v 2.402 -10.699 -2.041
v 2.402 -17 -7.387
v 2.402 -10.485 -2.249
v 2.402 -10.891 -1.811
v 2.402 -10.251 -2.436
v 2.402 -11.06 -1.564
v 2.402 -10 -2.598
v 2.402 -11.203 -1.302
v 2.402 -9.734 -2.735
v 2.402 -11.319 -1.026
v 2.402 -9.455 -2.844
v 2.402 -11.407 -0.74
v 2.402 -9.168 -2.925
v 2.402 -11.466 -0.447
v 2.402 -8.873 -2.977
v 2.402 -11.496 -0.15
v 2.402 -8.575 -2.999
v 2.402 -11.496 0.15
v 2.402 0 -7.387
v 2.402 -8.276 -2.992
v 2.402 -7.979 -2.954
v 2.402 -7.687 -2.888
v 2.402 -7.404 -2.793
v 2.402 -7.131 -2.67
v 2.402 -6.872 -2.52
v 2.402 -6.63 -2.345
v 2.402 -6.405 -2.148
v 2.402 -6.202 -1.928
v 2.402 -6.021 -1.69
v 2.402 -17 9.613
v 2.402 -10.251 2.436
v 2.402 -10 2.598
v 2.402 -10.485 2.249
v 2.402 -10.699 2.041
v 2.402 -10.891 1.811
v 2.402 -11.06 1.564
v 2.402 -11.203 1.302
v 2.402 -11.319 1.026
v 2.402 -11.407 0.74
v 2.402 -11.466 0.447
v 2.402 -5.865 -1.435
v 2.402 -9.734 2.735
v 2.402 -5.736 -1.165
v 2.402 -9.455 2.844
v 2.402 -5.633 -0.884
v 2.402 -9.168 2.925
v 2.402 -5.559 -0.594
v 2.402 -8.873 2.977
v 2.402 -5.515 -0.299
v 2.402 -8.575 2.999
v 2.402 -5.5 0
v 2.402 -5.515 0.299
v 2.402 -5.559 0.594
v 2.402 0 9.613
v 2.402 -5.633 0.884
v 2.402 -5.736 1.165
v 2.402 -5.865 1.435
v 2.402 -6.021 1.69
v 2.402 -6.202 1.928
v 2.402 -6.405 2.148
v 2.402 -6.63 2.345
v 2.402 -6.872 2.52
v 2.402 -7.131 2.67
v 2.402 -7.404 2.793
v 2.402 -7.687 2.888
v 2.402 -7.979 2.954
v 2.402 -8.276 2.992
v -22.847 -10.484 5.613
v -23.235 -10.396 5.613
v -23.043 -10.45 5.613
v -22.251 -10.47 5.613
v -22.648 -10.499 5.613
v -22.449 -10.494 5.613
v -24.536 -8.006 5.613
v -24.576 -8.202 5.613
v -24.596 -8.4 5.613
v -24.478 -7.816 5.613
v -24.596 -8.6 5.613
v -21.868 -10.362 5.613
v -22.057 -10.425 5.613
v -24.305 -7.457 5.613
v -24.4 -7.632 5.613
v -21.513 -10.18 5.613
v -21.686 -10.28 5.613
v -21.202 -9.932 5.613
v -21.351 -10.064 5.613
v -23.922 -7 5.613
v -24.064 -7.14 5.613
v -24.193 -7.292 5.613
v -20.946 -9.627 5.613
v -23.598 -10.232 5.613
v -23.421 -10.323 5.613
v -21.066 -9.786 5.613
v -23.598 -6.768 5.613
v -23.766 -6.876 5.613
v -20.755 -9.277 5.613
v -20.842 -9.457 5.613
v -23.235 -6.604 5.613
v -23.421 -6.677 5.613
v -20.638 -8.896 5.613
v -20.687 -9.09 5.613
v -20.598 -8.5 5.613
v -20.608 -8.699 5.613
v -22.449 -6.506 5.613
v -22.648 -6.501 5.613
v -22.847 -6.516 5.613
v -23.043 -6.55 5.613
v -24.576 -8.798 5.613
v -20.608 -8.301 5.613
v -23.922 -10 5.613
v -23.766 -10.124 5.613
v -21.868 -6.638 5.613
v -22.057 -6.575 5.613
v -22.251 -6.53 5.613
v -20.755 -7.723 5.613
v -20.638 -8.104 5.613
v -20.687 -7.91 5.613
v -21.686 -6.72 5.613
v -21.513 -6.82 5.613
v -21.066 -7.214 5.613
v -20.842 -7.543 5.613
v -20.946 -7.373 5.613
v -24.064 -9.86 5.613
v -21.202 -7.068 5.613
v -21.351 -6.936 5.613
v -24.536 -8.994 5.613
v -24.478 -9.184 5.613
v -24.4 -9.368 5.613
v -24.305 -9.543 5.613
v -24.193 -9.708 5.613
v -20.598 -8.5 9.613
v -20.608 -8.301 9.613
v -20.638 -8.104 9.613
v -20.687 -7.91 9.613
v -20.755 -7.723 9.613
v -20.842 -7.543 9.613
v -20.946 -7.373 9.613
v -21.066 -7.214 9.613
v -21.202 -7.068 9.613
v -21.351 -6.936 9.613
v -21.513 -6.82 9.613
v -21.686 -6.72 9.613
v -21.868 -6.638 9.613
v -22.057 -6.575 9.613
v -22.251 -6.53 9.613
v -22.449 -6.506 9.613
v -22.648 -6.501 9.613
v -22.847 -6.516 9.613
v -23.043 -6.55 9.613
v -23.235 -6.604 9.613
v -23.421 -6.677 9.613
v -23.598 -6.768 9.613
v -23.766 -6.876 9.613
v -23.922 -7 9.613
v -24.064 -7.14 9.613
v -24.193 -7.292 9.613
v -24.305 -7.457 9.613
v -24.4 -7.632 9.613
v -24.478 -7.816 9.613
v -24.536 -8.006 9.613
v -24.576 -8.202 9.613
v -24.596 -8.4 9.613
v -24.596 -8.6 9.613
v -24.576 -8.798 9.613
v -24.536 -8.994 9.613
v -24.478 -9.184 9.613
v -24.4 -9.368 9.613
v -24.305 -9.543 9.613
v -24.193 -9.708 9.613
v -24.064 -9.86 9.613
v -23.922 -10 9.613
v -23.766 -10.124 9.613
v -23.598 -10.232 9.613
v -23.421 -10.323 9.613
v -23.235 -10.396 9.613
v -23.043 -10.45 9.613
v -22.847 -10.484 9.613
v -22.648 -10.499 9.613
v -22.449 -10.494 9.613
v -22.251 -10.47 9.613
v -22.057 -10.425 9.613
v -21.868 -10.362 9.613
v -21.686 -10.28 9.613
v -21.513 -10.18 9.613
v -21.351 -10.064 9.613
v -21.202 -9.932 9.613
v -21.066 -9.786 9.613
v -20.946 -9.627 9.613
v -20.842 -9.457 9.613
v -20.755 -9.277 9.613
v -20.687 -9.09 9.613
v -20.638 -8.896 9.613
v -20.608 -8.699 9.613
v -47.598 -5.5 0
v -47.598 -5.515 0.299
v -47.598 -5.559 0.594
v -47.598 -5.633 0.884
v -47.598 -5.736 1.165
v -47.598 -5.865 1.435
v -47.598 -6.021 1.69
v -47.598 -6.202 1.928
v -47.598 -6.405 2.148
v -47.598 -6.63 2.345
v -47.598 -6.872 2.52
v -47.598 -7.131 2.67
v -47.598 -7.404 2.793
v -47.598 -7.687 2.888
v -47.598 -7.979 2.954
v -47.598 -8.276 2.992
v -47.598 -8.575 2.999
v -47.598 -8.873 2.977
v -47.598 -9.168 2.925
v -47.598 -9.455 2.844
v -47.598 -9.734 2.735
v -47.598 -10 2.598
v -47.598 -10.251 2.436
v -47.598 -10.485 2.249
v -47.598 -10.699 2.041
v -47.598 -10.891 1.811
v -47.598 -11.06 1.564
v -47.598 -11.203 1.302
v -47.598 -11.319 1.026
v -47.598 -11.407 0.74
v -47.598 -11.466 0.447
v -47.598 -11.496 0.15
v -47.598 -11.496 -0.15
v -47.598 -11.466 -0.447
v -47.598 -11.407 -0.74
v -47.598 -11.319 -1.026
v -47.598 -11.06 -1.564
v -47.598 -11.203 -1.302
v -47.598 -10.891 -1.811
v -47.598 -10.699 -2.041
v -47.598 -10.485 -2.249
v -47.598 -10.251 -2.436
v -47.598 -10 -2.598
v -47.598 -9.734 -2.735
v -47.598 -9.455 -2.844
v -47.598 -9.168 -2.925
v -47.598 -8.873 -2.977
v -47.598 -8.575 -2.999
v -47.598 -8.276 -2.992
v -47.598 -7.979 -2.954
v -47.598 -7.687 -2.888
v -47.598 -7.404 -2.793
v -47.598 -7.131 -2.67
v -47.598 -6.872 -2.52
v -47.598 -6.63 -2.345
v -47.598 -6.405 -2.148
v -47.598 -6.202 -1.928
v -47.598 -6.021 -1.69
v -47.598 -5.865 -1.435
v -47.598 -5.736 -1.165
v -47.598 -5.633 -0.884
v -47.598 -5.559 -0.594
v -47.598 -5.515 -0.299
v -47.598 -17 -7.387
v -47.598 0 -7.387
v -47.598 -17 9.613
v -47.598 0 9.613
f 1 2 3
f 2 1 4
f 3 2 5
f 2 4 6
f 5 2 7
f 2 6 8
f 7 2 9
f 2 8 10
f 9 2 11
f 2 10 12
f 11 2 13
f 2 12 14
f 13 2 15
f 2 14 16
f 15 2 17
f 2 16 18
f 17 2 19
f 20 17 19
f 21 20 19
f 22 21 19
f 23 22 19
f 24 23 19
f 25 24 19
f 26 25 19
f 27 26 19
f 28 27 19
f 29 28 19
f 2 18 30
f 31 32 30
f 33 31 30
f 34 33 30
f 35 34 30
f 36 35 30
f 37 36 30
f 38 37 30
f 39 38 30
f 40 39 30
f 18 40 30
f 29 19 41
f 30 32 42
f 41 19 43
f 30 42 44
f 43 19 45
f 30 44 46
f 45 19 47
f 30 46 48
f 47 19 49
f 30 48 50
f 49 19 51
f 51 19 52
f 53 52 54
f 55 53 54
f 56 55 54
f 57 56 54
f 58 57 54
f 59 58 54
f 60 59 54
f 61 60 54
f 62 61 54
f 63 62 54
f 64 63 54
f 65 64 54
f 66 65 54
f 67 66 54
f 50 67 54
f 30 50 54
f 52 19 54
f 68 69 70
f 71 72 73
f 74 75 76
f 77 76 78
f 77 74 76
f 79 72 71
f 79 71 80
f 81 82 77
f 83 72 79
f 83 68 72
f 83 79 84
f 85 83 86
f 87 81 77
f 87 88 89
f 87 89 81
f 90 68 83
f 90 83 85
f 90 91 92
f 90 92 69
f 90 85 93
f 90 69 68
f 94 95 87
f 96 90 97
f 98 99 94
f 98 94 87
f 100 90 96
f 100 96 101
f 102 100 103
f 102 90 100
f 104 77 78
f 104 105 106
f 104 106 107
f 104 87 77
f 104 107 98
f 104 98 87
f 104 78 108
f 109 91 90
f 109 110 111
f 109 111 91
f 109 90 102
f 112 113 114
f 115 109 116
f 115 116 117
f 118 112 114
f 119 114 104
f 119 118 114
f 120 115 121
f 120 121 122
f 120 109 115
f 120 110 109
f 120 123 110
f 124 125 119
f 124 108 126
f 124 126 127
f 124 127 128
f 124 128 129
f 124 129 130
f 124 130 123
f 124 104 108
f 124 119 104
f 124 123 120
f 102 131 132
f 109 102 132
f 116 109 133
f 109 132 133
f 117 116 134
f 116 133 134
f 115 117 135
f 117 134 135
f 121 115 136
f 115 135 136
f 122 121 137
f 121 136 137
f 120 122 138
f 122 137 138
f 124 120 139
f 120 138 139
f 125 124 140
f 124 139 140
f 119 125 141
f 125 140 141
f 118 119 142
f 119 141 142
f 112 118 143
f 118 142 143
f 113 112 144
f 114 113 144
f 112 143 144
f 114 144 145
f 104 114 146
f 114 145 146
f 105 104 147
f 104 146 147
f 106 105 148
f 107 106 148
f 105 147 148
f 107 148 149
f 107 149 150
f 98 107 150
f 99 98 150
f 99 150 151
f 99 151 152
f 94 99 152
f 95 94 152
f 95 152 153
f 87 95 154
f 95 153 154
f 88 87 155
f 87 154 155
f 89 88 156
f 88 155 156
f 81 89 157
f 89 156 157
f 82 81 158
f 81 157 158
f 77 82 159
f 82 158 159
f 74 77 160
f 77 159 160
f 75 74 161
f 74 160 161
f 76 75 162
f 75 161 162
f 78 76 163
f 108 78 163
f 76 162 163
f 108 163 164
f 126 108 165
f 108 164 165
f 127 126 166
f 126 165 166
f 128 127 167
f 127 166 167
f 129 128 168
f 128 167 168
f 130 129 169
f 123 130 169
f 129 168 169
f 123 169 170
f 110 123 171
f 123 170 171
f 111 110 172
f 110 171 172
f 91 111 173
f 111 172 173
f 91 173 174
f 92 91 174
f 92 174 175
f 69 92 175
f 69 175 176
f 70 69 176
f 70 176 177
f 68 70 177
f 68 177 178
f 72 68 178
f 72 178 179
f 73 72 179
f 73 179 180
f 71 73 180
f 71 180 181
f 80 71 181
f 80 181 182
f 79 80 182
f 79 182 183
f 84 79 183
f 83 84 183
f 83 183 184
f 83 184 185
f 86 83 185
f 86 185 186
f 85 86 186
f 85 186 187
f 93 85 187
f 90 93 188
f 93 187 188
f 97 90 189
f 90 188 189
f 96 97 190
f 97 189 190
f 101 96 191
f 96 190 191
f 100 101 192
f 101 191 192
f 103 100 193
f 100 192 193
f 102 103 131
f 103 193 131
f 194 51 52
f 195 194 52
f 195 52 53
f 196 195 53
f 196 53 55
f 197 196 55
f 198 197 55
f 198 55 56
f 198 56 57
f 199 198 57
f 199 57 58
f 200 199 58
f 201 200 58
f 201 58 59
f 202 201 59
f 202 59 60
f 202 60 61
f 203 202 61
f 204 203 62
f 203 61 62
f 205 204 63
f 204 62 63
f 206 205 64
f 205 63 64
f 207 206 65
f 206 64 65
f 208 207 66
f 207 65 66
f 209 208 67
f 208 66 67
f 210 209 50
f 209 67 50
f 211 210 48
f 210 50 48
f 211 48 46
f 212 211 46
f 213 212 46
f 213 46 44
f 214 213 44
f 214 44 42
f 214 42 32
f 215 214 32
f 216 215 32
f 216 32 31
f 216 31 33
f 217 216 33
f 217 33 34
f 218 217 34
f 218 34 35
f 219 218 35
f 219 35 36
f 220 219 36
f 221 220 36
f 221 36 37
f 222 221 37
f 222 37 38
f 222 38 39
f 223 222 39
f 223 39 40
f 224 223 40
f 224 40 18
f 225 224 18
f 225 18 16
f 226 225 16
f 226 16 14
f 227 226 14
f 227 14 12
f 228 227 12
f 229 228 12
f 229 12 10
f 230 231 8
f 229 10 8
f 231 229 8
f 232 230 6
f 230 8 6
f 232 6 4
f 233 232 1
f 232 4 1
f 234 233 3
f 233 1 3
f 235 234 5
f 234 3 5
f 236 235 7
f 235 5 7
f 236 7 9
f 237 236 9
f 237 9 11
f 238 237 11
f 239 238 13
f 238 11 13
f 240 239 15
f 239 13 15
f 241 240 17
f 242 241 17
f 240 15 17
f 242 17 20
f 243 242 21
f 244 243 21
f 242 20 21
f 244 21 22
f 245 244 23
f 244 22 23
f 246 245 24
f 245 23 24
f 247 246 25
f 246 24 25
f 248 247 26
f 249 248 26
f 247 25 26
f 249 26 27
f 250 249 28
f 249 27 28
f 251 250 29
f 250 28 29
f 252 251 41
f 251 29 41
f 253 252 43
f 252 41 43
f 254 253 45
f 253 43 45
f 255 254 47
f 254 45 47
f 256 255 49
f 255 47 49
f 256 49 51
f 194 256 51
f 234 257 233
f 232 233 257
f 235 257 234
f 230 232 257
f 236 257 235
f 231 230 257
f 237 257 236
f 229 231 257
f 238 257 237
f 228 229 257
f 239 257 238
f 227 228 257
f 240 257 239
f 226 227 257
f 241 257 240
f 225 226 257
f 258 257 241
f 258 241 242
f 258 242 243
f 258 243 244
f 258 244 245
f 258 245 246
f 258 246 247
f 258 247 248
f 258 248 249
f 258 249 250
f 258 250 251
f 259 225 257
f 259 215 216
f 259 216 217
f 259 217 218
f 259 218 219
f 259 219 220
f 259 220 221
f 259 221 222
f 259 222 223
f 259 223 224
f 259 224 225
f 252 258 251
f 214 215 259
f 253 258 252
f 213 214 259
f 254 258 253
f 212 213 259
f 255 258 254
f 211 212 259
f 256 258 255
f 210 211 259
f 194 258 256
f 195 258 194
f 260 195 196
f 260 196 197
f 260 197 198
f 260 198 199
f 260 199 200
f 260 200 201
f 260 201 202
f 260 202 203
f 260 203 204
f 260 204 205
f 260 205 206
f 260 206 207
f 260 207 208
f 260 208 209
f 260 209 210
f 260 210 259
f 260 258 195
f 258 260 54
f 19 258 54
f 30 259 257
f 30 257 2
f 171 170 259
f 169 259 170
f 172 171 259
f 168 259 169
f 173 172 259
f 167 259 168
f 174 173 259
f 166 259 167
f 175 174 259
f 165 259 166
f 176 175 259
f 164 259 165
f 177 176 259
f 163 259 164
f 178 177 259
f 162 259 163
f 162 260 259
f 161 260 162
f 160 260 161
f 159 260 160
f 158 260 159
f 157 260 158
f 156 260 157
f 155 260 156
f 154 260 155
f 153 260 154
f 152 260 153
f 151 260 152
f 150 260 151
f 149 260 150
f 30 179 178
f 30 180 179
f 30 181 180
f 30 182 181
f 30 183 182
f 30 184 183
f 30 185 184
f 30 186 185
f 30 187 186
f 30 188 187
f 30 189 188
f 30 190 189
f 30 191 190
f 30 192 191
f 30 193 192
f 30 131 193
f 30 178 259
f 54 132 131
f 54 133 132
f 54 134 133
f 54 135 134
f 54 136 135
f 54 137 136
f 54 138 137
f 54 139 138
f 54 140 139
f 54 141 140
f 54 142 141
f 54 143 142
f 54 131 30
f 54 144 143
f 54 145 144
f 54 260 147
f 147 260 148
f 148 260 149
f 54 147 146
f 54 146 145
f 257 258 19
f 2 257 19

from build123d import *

# Parameters (mm, degrees)
F0_W     = 50
F0_H     = 17
F1_DEPTH = 17
F2_R     = 3
F3_DEPTH = 50.1
F4_R     = 2
F5_DEPTH = 4


with BuildPart() as f1:
    # F0 (on Front) → F1 (new body)
    with BuildSketch(Plane.XZ):
        with Locations((-22.598265, 1.11262)):
            Rectangle(F0_W, F0_H)
    extrude(amount=F1_DEPTH)

    # F2 (on face) → F3 (cut)
    with BuildSketch(Plane.YZ.offset(2.401735)):
        with Locations((-8.5, 0)):
            Circle(F2_R)
    extrude(amount=-F3_DEPTH, mode=Mode.SUBTRACT)

    # F4 (on face) → F5 (cut)
    with BuildSketch(Plane.XY.offset(9.61262)):
        with Locations((-22.598265, -8.5)):
            Circle(F4_R)
    extrude(amount=-F5_DEPTH, mode=Mode.SUBTRACT)


solid = f1.part
